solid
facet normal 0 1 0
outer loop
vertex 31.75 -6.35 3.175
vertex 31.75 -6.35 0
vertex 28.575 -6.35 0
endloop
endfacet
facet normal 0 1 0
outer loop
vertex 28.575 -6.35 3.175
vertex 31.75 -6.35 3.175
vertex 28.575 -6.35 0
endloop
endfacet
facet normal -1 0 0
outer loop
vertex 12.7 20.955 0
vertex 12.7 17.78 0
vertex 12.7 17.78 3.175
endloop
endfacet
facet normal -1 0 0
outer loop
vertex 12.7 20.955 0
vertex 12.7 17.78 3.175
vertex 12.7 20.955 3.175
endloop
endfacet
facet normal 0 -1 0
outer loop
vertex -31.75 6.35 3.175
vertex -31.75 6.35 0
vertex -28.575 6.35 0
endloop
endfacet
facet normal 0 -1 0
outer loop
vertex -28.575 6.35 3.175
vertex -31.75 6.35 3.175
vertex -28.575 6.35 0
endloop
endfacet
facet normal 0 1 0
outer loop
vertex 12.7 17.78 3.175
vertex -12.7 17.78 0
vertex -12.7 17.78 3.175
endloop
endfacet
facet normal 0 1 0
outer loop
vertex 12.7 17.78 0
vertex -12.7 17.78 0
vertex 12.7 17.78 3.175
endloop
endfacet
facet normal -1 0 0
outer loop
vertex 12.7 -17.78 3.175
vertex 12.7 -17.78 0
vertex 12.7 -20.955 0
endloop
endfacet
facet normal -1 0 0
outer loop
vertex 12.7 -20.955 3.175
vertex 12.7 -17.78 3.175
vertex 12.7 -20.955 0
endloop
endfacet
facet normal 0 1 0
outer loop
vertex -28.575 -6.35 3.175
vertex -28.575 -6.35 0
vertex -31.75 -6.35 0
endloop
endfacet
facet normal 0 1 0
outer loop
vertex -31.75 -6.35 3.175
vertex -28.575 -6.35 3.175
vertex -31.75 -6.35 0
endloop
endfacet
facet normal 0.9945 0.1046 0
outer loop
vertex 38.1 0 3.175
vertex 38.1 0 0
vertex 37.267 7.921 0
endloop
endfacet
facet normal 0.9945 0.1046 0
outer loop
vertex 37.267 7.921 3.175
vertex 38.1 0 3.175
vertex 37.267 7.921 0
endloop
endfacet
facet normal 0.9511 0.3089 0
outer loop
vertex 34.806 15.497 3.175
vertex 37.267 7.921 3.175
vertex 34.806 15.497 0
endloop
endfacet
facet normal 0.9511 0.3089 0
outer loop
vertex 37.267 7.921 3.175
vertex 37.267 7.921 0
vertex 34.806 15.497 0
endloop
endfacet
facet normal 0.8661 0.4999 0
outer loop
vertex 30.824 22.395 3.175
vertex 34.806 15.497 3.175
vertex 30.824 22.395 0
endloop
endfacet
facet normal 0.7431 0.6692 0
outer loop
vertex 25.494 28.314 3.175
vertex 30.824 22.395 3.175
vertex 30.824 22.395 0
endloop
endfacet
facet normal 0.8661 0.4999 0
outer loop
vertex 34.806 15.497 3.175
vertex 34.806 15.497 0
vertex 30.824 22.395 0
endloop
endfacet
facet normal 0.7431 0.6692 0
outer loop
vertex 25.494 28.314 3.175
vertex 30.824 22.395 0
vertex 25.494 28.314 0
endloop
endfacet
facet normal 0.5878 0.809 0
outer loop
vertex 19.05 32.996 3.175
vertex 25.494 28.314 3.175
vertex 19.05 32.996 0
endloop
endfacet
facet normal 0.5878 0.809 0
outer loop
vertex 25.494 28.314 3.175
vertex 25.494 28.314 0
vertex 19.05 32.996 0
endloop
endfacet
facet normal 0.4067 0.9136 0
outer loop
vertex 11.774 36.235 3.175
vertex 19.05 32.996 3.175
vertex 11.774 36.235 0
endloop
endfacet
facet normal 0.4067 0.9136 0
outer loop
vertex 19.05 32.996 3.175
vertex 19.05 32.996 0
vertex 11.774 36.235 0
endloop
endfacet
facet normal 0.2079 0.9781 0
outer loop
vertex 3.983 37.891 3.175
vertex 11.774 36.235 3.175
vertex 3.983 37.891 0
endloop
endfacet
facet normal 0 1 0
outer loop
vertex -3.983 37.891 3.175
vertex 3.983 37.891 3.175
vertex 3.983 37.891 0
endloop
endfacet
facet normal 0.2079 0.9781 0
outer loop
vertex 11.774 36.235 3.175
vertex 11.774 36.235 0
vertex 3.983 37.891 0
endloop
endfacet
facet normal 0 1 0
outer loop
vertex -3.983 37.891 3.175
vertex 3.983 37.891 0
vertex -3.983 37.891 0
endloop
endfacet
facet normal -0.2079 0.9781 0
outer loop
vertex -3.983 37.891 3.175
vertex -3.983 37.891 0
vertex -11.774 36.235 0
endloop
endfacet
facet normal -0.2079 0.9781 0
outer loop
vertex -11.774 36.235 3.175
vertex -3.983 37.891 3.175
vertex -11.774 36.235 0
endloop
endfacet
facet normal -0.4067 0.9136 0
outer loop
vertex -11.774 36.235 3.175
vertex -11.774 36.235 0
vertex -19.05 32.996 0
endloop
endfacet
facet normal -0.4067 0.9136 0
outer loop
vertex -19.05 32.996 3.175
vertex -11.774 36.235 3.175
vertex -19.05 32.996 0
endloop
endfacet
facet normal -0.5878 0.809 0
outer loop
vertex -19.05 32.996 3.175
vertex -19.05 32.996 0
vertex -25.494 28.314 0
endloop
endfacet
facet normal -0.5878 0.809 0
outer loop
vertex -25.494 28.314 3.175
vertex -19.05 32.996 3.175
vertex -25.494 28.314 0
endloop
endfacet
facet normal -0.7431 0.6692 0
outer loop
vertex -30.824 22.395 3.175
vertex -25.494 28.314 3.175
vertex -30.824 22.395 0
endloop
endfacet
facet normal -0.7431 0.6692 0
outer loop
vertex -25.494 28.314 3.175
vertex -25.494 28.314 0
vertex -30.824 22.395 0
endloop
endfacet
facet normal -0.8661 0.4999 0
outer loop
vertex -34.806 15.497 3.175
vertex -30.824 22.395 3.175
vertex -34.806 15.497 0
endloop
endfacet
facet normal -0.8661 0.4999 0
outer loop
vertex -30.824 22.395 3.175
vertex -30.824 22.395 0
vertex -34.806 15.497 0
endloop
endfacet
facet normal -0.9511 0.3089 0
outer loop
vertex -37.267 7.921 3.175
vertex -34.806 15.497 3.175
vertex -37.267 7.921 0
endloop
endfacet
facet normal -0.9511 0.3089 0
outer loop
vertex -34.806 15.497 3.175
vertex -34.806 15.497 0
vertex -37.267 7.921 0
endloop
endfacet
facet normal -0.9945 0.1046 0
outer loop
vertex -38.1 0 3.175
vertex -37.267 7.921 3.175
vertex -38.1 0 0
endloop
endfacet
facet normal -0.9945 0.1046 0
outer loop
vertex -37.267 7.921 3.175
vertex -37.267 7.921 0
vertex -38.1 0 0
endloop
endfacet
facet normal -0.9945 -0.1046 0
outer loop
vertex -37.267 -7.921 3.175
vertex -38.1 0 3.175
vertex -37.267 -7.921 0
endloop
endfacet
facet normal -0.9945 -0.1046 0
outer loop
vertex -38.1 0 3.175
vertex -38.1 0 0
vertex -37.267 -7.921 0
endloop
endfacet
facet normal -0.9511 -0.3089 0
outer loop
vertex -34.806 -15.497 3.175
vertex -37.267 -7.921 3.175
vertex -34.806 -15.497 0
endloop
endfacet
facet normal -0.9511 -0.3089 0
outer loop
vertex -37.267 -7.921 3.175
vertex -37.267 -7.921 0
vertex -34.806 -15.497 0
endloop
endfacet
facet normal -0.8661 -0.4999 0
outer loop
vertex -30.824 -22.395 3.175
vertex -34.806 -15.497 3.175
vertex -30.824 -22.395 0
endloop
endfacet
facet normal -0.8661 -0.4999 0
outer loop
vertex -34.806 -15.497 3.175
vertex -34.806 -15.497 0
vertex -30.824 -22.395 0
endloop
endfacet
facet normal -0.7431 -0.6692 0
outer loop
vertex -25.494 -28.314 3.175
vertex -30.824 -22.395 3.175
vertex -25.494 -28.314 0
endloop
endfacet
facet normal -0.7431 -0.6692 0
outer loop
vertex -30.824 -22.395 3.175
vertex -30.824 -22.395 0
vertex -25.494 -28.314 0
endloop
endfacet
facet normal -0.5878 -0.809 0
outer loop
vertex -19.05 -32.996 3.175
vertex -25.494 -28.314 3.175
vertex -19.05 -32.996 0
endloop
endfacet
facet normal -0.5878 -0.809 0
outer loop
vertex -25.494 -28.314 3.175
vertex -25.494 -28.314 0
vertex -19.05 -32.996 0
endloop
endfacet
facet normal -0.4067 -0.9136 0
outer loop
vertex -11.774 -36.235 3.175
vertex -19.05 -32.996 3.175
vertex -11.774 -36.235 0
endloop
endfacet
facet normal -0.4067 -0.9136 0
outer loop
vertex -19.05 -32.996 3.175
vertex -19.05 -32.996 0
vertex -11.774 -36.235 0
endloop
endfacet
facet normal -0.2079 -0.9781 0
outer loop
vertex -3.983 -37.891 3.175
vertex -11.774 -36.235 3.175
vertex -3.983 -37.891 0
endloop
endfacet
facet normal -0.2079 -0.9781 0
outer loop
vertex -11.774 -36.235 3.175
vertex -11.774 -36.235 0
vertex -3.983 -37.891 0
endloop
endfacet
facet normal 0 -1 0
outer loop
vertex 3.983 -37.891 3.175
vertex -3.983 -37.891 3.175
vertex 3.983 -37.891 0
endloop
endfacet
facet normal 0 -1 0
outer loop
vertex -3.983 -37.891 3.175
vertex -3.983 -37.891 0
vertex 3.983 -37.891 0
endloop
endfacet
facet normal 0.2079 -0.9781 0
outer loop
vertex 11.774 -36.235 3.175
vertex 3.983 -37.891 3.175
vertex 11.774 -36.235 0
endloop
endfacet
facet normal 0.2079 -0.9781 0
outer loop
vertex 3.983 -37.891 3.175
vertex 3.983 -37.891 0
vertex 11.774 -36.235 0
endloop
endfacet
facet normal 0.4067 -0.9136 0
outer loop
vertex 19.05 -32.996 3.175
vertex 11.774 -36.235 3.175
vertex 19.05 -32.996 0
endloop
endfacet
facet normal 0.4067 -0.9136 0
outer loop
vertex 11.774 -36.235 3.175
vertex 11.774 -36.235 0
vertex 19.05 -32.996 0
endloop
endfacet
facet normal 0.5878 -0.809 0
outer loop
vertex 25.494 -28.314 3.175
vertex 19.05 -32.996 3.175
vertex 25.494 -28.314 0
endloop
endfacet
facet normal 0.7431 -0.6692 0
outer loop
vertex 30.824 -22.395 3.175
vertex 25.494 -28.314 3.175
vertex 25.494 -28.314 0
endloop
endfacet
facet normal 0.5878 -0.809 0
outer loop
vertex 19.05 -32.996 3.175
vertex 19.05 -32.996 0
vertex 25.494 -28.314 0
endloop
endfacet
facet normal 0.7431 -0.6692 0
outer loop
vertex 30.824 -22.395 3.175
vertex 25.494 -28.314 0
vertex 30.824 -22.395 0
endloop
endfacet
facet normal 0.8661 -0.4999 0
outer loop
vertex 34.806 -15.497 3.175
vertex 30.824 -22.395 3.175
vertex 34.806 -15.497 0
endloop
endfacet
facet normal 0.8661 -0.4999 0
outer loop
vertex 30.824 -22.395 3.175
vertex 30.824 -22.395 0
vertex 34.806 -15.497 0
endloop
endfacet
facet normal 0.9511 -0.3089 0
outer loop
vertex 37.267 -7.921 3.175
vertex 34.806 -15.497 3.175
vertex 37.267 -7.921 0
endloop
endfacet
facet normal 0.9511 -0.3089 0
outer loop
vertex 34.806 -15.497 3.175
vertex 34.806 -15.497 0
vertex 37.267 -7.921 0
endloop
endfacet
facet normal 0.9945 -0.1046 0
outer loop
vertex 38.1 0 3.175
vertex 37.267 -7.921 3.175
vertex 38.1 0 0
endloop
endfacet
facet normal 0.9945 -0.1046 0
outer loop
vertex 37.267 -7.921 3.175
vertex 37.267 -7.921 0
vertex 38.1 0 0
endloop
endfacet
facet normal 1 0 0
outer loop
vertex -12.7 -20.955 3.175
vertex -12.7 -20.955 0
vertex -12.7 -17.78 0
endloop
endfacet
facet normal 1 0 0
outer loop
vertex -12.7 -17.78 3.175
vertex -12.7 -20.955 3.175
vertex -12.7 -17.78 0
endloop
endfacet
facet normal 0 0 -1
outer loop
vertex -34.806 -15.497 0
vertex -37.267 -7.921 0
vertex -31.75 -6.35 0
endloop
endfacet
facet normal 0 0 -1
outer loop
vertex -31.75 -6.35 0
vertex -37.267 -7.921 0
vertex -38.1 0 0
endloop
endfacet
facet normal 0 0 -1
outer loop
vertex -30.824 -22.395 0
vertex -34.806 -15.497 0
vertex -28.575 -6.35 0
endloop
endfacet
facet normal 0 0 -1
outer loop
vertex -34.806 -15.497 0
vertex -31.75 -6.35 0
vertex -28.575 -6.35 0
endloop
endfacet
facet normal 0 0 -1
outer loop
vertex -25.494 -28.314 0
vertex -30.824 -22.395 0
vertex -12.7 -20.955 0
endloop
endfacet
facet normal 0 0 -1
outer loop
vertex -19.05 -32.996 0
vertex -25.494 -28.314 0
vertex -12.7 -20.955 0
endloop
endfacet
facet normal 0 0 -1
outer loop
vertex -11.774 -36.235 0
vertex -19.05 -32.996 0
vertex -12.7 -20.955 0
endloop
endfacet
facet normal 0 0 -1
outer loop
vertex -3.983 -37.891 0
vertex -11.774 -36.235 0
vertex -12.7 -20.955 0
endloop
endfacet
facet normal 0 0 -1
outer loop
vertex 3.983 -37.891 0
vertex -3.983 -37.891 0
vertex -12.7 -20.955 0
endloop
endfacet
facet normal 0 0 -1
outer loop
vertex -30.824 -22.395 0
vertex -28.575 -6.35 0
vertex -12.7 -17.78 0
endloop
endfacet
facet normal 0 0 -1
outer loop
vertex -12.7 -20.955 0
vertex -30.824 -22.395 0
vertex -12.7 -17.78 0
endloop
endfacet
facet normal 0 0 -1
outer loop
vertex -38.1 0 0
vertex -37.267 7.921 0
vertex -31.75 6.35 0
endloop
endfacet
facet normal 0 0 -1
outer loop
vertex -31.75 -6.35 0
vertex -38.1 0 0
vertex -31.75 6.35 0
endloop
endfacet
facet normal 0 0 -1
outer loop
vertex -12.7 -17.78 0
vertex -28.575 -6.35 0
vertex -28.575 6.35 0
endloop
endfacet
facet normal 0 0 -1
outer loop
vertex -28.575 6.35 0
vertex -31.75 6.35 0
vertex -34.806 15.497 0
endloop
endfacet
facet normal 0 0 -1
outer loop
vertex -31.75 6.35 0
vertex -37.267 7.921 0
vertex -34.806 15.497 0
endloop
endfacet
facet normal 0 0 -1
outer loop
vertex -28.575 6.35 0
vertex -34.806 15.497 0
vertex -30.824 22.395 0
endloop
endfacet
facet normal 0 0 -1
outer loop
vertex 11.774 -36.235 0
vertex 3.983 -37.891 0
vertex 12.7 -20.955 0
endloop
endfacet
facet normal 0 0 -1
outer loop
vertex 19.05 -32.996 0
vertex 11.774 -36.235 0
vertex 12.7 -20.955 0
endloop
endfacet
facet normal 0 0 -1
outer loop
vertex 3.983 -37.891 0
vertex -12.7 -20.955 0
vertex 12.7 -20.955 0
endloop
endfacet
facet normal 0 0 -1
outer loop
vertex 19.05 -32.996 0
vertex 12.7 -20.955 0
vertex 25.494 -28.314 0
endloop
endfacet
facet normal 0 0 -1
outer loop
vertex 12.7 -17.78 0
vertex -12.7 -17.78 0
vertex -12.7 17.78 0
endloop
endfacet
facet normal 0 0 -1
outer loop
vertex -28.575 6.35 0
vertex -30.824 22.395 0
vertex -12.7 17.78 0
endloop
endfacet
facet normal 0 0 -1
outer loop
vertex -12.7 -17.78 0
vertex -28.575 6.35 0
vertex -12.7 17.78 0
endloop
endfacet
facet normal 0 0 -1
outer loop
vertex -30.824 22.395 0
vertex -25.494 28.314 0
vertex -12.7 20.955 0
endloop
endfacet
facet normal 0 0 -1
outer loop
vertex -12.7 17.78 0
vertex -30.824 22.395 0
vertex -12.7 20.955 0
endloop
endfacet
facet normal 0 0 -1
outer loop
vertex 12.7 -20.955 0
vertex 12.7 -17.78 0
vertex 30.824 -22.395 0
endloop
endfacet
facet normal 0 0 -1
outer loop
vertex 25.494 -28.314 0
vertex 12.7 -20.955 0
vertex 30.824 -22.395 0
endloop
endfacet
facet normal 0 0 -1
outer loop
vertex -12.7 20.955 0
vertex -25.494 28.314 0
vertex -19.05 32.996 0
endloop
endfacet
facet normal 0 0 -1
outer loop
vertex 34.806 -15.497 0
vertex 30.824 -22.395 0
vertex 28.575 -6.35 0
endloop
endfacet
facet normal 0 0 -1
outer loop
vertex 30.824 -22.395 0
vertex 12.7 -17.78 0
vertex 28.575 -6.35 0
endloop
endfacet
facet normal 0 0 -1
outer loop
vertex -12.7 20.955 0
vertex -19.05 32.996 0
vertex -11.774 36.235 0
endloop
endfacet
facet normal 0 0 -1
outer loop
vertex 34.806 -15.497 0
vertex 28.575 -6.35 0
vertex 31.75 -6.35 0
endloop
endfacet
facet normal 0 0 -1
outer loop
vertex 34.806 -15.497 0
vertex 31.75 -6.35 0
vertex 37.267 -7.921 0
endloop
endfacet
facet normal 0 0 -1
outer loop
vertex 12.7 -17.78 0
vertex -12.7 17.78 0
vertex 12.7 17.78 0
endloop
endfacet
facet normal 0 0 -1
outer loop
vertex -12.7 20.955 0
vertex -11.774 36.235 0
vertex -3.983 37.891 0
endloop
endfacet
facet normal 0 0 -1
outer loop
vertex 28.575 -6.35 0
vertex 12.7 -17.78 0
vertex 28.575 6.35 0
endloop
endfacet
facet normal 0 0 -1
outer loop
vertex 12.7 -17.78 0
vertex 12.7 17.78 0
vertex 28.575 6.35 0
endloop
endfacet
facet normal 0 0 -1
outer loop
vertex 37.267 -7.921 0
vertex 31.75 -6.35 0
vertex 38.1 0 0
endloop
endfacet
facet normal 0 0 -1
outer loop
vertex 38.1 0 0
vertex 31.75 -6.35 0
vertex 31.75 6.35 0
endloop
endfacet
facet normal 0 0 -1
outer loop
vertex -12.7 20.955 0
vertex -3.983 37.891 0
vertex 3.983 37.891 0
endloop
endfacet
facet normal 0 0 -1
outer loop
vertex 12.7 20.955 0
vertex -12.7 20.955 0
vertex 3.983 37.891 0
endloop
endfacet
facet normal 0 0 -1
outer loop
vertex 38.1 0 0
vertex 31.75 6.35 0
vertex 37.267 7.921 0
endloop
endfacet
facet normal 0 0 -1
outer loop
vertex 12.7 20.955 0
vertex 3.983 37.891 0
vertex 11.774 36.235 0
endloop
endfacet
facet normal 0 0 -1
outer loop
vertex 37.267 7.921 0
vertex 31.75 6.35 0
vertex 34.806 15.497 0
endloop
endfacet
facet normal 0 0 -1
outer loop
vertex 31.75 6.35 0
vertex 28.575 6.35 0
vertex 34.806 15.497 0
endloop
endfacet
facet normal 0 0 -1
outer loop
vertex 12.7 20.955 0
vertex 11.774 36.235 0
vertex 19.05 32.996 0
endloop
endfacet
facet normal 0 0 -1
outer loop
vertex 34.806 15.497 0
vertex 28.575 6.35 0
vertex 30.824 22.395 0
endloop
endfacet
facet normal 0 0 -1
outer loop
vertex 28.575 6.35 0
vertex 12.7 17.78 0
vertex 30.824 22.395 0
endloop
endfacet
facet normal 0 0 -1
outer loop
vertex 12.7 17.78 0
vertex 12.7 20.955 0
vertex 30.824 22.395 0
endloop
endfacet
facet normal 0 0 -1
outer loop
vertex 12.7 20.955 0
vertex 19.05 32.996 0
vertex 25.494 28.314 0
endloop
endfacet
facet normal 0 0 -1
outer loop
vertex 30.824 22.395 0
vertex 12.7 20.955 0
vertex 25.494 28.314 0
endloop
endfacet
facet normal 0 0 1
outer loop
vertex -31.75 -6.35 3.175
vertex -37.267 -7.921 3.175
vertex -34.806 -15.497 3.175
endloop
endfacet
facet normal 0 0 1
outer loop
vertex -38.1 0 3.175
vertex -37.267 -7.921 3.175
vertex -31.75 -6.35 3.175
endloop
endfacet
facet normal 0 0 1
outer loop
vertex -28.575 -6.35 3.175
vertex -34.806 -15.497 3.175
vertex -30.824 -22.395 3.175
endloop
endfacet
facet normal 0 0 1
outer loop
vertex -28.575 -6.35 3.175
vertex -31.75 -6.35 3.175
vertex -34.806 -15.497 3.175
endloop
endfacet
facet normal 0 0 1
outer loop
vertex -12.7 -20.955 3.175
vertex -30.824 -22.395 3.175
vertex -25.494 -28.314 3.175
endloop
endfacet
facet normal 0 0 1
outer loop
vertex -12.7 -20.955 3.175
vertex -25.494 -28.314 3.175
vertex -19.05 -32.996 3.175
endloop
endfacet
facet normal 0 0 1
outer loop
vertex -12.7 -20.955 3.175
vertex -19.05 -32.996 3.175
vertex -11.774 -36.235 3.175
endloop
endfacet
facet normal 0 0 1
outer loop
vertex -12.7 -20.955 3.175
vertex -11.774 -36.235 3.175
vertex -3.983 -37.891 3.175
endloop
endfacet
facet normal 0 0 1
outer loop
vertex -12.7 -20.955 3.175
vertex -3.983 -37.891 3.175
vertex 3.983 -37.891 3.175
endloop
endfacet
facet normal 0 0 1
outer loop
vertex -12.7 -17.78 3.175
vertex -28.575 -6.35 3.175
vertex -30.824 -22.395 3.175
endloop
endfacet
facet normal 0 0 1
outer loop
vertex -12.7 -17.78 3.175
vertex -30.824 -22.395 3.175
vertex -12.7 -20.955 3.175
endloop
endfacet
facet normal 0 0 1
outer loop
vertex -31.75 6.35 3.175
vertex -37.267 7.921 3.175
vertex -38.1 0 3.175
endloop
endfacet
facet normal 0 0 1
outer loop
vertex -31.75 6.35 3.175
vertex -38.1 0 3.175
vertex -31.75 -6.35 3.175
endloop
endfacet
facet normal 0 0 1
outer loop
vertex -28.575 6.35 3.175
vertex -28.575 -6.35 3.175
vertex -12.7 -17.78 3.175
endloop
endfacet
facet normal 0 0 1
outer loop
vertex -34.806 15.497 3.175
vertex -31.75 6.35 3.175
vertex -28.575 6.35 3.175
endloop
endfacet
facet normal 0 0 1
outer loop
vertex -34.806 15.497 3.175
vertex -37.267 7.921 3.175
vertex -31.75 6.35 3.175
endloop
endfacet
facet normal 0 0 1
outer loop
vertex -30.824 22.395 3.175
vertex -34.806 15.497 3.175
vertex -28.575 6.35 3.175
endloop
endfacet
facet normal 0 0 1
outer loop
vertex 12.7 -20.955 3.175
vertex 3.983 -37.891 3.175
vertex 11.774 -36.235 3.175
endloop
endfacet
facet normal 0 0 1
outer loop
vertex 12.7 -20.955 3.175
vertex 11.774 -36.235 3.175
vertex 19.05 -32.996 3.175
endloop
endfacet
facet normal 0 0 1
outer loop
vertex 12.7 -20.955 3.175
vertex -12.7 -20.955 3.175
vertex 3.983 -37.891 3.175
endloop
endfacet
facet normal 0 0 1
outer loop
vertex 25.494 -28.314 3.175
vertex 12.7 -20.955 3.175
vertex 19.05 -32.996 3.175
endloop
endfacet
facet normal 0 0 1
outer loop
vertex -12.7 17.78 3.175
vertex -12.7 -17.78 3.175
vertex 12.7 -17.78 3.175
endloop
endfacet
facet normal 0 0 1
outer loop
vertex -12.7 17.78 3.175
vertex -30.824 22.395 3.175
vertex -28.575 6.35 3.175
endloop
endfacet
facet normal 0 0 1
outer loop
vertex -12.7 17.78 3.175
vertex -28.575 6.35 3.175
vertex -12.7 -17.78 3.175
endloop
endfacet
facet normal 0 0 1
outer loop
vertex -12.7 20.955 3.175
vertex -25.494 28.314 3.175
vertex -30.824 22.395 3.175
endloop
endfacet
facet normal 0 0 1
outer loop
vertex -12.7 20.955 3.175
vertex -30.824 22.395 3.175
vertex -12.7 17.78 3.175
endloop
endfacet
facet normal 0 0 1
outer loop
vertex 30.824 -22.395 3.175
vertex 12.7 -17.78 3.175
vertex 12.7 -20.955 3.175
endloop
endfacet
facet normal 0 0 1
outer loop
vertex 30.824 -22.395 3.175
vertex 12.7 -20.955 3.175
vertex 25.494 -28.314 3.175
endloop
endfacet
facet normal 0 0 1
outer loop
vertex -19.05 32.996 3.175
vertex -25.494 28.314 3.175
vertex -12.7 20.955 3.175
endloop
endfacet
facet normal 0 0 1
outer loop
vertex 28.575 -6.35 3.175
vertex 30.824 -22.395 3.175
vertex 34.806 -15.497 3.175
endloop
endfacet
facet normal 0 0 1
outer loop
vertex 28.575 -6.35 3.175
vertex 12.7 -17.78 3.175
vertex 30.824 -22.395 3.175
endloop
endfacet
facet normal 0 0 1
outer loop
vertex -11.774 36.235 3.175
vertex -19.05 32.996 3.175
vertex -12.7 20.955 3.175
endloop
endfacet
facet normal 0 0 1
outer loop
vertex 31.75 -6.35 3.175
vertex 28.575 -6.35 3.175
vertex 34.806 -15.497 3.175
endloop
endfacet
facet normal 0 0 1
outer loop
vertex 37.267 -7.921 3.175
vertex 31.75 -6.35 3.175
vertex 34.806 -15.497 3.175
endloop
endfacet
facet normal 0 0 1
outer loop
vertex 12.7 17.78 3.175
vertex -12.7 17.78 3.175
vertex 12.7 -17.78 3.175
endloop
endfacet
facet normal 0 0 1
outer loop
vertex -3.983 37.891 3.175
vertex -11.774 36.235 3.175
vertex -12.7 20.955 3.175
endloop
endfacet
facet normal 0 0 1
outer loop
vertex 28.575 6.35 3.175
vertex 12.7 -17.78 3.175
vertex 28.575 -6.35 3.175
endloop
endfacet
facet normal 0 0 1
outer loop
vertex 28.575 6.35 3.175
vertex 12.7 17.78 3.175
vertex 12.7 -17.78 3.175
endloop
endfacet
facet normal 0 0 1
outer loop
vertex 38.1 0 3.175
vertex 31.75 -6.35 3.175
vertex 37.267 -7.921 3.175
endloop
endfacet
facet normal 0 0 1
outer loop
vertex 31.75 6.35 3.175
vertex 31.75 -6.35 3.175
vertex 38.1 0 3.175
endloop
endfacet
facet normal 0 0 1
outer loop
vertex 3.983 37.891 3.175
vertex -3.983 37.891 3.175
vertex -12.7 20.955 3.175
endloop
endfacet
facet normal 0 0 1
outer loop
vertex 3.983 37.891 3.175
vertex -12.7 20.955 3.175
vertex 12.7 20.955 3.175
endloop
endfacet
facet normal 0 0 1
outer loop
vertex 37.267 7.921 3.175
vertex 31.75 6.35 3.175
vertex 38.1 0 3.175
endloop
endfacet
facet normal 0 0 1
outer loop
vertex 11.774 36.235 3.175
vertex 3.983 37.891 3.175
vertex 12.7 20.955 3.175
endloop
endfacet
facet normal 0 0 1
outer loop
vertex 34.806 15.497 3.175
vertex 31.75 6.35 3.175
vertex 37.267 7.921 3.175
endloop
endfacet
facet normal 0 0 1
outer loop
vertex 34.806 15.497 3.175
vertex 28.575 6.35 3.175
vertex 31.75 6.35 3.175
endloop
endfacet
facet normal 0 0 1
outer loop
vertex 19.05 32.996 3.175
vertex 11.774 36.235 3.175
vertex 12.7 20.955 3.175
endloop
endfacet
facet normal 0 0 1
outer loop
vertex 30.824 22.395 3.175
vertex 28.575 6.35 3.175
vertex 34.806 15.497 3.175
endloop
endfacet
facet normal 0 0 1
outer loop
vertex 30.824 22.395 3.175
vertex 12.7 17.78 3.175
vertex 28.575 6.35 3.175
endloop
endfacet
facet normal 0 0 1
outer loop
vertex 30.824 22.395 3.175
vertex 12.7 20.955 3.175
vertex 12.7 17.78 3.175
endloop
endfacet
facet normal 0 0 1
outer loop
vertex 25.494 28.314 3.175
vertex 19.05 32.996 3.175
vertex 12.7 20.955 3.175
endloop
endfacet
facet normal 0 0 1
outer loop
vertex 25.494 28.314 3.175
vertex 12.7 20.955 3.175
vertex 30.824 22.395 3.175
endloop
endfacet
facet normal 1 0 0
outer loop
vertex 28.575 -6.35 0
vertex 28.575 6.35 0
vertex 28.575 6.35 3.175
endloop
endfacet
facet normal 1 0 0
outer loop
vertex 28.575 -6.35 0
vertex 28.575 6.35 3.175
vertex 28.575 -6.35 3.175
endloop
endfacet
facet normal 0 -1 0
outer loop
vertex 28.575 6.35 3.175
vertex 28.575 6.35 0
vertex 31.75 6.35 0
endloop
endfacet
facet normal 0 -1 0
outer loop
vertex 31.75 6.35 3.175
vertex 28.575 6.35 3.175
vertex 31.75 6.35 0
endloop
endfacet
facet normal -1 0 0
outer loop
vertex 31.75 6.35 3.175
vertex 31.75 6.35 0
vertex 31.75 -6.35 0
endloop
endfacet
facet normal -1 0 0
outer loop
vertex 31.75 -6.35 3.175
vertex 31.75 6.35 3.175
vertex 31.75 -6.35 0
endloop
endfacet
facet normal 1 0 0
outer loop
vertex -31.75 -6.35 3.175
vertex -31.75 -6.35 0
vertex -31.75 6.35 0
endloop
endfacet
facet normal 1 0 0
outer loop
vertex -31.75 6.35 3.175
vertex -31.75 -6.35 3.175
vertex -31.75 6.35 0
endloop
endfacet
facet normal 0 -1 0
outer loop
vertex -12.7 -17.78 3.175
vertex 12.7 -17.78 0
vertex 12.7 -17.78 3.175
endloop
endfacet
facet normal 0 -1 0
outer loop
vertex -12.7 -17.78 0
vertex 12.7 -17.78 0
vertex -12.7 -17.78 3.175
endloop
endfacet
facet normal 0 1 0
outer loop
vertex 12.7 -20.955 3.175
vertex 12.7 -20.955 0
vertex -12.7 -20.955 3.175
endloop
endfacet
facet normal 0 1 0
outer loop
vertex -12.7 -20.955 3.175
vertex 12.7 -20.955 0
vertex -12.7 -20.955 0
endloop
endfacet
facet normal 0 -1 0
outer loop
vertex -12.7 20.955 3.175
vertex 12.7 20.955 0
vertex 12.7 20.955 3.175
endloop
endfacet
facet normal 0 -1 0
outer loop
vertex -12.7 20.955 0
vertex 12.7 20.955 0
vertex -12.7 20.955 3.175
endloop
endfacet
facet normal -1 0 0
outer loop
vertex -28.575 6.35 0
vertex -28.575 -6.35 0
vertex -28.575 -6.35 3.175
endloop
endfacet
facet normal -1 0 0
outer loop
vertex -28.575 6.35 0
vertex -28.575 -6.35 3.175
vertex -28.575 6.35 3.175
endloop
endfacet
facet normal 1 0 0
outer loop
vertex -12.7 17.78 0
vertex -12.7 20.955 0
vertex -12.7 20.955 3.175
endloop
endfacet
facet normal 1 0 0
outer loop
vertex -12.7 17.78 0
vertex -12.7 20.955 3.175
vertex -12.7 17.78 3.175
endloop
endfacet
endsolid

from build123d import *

# Parameters (mm, degrees)
SKETCH1_R           = 38.1
BOSS_EXTRUDE1_DEPTH = 3.175
CUT_EXTRUDE1_DEPTH  = 3.175


with BuildPart() as part:
    # Sketch1 → Boss-Extrude1 (new body)
    with BuildSketch(Plane.XY):
        Circle(SKETCH1_R)
    extrude(amount=BOSS_EXTRUDE1_DEPTH)

    # Sketch2 → Cut-Extrude1 (cut)
    with BuildSketch(Plane.XY):
        Polygon((0, 17.78), (12.7, 17.78), (12.7, 20.955), (-12.7, 20.955), (-12.7, 17.78), align=None)
        Polygon((0, -17.78), (12.7, -17.78), (12.7, -20.955), (-12.7, -20.955), (-12.7, -17.78), align=None)
        Polygon((-28.575, 0), (-28.575, -6.35), (-31.75, -6.35), (-31.75, 6.35), (-28.575, 6.35), align=None)
        Polygon((28.575, 0), (28.575, 6.35), (31.75, 6.35), (31.75, -6.35), (28.575, -6.35), align=None)
    extrude(amount=CUT_EXTRUDE1_DEPTH, mode=Mode.SUBTRACT)


solid = part.part
